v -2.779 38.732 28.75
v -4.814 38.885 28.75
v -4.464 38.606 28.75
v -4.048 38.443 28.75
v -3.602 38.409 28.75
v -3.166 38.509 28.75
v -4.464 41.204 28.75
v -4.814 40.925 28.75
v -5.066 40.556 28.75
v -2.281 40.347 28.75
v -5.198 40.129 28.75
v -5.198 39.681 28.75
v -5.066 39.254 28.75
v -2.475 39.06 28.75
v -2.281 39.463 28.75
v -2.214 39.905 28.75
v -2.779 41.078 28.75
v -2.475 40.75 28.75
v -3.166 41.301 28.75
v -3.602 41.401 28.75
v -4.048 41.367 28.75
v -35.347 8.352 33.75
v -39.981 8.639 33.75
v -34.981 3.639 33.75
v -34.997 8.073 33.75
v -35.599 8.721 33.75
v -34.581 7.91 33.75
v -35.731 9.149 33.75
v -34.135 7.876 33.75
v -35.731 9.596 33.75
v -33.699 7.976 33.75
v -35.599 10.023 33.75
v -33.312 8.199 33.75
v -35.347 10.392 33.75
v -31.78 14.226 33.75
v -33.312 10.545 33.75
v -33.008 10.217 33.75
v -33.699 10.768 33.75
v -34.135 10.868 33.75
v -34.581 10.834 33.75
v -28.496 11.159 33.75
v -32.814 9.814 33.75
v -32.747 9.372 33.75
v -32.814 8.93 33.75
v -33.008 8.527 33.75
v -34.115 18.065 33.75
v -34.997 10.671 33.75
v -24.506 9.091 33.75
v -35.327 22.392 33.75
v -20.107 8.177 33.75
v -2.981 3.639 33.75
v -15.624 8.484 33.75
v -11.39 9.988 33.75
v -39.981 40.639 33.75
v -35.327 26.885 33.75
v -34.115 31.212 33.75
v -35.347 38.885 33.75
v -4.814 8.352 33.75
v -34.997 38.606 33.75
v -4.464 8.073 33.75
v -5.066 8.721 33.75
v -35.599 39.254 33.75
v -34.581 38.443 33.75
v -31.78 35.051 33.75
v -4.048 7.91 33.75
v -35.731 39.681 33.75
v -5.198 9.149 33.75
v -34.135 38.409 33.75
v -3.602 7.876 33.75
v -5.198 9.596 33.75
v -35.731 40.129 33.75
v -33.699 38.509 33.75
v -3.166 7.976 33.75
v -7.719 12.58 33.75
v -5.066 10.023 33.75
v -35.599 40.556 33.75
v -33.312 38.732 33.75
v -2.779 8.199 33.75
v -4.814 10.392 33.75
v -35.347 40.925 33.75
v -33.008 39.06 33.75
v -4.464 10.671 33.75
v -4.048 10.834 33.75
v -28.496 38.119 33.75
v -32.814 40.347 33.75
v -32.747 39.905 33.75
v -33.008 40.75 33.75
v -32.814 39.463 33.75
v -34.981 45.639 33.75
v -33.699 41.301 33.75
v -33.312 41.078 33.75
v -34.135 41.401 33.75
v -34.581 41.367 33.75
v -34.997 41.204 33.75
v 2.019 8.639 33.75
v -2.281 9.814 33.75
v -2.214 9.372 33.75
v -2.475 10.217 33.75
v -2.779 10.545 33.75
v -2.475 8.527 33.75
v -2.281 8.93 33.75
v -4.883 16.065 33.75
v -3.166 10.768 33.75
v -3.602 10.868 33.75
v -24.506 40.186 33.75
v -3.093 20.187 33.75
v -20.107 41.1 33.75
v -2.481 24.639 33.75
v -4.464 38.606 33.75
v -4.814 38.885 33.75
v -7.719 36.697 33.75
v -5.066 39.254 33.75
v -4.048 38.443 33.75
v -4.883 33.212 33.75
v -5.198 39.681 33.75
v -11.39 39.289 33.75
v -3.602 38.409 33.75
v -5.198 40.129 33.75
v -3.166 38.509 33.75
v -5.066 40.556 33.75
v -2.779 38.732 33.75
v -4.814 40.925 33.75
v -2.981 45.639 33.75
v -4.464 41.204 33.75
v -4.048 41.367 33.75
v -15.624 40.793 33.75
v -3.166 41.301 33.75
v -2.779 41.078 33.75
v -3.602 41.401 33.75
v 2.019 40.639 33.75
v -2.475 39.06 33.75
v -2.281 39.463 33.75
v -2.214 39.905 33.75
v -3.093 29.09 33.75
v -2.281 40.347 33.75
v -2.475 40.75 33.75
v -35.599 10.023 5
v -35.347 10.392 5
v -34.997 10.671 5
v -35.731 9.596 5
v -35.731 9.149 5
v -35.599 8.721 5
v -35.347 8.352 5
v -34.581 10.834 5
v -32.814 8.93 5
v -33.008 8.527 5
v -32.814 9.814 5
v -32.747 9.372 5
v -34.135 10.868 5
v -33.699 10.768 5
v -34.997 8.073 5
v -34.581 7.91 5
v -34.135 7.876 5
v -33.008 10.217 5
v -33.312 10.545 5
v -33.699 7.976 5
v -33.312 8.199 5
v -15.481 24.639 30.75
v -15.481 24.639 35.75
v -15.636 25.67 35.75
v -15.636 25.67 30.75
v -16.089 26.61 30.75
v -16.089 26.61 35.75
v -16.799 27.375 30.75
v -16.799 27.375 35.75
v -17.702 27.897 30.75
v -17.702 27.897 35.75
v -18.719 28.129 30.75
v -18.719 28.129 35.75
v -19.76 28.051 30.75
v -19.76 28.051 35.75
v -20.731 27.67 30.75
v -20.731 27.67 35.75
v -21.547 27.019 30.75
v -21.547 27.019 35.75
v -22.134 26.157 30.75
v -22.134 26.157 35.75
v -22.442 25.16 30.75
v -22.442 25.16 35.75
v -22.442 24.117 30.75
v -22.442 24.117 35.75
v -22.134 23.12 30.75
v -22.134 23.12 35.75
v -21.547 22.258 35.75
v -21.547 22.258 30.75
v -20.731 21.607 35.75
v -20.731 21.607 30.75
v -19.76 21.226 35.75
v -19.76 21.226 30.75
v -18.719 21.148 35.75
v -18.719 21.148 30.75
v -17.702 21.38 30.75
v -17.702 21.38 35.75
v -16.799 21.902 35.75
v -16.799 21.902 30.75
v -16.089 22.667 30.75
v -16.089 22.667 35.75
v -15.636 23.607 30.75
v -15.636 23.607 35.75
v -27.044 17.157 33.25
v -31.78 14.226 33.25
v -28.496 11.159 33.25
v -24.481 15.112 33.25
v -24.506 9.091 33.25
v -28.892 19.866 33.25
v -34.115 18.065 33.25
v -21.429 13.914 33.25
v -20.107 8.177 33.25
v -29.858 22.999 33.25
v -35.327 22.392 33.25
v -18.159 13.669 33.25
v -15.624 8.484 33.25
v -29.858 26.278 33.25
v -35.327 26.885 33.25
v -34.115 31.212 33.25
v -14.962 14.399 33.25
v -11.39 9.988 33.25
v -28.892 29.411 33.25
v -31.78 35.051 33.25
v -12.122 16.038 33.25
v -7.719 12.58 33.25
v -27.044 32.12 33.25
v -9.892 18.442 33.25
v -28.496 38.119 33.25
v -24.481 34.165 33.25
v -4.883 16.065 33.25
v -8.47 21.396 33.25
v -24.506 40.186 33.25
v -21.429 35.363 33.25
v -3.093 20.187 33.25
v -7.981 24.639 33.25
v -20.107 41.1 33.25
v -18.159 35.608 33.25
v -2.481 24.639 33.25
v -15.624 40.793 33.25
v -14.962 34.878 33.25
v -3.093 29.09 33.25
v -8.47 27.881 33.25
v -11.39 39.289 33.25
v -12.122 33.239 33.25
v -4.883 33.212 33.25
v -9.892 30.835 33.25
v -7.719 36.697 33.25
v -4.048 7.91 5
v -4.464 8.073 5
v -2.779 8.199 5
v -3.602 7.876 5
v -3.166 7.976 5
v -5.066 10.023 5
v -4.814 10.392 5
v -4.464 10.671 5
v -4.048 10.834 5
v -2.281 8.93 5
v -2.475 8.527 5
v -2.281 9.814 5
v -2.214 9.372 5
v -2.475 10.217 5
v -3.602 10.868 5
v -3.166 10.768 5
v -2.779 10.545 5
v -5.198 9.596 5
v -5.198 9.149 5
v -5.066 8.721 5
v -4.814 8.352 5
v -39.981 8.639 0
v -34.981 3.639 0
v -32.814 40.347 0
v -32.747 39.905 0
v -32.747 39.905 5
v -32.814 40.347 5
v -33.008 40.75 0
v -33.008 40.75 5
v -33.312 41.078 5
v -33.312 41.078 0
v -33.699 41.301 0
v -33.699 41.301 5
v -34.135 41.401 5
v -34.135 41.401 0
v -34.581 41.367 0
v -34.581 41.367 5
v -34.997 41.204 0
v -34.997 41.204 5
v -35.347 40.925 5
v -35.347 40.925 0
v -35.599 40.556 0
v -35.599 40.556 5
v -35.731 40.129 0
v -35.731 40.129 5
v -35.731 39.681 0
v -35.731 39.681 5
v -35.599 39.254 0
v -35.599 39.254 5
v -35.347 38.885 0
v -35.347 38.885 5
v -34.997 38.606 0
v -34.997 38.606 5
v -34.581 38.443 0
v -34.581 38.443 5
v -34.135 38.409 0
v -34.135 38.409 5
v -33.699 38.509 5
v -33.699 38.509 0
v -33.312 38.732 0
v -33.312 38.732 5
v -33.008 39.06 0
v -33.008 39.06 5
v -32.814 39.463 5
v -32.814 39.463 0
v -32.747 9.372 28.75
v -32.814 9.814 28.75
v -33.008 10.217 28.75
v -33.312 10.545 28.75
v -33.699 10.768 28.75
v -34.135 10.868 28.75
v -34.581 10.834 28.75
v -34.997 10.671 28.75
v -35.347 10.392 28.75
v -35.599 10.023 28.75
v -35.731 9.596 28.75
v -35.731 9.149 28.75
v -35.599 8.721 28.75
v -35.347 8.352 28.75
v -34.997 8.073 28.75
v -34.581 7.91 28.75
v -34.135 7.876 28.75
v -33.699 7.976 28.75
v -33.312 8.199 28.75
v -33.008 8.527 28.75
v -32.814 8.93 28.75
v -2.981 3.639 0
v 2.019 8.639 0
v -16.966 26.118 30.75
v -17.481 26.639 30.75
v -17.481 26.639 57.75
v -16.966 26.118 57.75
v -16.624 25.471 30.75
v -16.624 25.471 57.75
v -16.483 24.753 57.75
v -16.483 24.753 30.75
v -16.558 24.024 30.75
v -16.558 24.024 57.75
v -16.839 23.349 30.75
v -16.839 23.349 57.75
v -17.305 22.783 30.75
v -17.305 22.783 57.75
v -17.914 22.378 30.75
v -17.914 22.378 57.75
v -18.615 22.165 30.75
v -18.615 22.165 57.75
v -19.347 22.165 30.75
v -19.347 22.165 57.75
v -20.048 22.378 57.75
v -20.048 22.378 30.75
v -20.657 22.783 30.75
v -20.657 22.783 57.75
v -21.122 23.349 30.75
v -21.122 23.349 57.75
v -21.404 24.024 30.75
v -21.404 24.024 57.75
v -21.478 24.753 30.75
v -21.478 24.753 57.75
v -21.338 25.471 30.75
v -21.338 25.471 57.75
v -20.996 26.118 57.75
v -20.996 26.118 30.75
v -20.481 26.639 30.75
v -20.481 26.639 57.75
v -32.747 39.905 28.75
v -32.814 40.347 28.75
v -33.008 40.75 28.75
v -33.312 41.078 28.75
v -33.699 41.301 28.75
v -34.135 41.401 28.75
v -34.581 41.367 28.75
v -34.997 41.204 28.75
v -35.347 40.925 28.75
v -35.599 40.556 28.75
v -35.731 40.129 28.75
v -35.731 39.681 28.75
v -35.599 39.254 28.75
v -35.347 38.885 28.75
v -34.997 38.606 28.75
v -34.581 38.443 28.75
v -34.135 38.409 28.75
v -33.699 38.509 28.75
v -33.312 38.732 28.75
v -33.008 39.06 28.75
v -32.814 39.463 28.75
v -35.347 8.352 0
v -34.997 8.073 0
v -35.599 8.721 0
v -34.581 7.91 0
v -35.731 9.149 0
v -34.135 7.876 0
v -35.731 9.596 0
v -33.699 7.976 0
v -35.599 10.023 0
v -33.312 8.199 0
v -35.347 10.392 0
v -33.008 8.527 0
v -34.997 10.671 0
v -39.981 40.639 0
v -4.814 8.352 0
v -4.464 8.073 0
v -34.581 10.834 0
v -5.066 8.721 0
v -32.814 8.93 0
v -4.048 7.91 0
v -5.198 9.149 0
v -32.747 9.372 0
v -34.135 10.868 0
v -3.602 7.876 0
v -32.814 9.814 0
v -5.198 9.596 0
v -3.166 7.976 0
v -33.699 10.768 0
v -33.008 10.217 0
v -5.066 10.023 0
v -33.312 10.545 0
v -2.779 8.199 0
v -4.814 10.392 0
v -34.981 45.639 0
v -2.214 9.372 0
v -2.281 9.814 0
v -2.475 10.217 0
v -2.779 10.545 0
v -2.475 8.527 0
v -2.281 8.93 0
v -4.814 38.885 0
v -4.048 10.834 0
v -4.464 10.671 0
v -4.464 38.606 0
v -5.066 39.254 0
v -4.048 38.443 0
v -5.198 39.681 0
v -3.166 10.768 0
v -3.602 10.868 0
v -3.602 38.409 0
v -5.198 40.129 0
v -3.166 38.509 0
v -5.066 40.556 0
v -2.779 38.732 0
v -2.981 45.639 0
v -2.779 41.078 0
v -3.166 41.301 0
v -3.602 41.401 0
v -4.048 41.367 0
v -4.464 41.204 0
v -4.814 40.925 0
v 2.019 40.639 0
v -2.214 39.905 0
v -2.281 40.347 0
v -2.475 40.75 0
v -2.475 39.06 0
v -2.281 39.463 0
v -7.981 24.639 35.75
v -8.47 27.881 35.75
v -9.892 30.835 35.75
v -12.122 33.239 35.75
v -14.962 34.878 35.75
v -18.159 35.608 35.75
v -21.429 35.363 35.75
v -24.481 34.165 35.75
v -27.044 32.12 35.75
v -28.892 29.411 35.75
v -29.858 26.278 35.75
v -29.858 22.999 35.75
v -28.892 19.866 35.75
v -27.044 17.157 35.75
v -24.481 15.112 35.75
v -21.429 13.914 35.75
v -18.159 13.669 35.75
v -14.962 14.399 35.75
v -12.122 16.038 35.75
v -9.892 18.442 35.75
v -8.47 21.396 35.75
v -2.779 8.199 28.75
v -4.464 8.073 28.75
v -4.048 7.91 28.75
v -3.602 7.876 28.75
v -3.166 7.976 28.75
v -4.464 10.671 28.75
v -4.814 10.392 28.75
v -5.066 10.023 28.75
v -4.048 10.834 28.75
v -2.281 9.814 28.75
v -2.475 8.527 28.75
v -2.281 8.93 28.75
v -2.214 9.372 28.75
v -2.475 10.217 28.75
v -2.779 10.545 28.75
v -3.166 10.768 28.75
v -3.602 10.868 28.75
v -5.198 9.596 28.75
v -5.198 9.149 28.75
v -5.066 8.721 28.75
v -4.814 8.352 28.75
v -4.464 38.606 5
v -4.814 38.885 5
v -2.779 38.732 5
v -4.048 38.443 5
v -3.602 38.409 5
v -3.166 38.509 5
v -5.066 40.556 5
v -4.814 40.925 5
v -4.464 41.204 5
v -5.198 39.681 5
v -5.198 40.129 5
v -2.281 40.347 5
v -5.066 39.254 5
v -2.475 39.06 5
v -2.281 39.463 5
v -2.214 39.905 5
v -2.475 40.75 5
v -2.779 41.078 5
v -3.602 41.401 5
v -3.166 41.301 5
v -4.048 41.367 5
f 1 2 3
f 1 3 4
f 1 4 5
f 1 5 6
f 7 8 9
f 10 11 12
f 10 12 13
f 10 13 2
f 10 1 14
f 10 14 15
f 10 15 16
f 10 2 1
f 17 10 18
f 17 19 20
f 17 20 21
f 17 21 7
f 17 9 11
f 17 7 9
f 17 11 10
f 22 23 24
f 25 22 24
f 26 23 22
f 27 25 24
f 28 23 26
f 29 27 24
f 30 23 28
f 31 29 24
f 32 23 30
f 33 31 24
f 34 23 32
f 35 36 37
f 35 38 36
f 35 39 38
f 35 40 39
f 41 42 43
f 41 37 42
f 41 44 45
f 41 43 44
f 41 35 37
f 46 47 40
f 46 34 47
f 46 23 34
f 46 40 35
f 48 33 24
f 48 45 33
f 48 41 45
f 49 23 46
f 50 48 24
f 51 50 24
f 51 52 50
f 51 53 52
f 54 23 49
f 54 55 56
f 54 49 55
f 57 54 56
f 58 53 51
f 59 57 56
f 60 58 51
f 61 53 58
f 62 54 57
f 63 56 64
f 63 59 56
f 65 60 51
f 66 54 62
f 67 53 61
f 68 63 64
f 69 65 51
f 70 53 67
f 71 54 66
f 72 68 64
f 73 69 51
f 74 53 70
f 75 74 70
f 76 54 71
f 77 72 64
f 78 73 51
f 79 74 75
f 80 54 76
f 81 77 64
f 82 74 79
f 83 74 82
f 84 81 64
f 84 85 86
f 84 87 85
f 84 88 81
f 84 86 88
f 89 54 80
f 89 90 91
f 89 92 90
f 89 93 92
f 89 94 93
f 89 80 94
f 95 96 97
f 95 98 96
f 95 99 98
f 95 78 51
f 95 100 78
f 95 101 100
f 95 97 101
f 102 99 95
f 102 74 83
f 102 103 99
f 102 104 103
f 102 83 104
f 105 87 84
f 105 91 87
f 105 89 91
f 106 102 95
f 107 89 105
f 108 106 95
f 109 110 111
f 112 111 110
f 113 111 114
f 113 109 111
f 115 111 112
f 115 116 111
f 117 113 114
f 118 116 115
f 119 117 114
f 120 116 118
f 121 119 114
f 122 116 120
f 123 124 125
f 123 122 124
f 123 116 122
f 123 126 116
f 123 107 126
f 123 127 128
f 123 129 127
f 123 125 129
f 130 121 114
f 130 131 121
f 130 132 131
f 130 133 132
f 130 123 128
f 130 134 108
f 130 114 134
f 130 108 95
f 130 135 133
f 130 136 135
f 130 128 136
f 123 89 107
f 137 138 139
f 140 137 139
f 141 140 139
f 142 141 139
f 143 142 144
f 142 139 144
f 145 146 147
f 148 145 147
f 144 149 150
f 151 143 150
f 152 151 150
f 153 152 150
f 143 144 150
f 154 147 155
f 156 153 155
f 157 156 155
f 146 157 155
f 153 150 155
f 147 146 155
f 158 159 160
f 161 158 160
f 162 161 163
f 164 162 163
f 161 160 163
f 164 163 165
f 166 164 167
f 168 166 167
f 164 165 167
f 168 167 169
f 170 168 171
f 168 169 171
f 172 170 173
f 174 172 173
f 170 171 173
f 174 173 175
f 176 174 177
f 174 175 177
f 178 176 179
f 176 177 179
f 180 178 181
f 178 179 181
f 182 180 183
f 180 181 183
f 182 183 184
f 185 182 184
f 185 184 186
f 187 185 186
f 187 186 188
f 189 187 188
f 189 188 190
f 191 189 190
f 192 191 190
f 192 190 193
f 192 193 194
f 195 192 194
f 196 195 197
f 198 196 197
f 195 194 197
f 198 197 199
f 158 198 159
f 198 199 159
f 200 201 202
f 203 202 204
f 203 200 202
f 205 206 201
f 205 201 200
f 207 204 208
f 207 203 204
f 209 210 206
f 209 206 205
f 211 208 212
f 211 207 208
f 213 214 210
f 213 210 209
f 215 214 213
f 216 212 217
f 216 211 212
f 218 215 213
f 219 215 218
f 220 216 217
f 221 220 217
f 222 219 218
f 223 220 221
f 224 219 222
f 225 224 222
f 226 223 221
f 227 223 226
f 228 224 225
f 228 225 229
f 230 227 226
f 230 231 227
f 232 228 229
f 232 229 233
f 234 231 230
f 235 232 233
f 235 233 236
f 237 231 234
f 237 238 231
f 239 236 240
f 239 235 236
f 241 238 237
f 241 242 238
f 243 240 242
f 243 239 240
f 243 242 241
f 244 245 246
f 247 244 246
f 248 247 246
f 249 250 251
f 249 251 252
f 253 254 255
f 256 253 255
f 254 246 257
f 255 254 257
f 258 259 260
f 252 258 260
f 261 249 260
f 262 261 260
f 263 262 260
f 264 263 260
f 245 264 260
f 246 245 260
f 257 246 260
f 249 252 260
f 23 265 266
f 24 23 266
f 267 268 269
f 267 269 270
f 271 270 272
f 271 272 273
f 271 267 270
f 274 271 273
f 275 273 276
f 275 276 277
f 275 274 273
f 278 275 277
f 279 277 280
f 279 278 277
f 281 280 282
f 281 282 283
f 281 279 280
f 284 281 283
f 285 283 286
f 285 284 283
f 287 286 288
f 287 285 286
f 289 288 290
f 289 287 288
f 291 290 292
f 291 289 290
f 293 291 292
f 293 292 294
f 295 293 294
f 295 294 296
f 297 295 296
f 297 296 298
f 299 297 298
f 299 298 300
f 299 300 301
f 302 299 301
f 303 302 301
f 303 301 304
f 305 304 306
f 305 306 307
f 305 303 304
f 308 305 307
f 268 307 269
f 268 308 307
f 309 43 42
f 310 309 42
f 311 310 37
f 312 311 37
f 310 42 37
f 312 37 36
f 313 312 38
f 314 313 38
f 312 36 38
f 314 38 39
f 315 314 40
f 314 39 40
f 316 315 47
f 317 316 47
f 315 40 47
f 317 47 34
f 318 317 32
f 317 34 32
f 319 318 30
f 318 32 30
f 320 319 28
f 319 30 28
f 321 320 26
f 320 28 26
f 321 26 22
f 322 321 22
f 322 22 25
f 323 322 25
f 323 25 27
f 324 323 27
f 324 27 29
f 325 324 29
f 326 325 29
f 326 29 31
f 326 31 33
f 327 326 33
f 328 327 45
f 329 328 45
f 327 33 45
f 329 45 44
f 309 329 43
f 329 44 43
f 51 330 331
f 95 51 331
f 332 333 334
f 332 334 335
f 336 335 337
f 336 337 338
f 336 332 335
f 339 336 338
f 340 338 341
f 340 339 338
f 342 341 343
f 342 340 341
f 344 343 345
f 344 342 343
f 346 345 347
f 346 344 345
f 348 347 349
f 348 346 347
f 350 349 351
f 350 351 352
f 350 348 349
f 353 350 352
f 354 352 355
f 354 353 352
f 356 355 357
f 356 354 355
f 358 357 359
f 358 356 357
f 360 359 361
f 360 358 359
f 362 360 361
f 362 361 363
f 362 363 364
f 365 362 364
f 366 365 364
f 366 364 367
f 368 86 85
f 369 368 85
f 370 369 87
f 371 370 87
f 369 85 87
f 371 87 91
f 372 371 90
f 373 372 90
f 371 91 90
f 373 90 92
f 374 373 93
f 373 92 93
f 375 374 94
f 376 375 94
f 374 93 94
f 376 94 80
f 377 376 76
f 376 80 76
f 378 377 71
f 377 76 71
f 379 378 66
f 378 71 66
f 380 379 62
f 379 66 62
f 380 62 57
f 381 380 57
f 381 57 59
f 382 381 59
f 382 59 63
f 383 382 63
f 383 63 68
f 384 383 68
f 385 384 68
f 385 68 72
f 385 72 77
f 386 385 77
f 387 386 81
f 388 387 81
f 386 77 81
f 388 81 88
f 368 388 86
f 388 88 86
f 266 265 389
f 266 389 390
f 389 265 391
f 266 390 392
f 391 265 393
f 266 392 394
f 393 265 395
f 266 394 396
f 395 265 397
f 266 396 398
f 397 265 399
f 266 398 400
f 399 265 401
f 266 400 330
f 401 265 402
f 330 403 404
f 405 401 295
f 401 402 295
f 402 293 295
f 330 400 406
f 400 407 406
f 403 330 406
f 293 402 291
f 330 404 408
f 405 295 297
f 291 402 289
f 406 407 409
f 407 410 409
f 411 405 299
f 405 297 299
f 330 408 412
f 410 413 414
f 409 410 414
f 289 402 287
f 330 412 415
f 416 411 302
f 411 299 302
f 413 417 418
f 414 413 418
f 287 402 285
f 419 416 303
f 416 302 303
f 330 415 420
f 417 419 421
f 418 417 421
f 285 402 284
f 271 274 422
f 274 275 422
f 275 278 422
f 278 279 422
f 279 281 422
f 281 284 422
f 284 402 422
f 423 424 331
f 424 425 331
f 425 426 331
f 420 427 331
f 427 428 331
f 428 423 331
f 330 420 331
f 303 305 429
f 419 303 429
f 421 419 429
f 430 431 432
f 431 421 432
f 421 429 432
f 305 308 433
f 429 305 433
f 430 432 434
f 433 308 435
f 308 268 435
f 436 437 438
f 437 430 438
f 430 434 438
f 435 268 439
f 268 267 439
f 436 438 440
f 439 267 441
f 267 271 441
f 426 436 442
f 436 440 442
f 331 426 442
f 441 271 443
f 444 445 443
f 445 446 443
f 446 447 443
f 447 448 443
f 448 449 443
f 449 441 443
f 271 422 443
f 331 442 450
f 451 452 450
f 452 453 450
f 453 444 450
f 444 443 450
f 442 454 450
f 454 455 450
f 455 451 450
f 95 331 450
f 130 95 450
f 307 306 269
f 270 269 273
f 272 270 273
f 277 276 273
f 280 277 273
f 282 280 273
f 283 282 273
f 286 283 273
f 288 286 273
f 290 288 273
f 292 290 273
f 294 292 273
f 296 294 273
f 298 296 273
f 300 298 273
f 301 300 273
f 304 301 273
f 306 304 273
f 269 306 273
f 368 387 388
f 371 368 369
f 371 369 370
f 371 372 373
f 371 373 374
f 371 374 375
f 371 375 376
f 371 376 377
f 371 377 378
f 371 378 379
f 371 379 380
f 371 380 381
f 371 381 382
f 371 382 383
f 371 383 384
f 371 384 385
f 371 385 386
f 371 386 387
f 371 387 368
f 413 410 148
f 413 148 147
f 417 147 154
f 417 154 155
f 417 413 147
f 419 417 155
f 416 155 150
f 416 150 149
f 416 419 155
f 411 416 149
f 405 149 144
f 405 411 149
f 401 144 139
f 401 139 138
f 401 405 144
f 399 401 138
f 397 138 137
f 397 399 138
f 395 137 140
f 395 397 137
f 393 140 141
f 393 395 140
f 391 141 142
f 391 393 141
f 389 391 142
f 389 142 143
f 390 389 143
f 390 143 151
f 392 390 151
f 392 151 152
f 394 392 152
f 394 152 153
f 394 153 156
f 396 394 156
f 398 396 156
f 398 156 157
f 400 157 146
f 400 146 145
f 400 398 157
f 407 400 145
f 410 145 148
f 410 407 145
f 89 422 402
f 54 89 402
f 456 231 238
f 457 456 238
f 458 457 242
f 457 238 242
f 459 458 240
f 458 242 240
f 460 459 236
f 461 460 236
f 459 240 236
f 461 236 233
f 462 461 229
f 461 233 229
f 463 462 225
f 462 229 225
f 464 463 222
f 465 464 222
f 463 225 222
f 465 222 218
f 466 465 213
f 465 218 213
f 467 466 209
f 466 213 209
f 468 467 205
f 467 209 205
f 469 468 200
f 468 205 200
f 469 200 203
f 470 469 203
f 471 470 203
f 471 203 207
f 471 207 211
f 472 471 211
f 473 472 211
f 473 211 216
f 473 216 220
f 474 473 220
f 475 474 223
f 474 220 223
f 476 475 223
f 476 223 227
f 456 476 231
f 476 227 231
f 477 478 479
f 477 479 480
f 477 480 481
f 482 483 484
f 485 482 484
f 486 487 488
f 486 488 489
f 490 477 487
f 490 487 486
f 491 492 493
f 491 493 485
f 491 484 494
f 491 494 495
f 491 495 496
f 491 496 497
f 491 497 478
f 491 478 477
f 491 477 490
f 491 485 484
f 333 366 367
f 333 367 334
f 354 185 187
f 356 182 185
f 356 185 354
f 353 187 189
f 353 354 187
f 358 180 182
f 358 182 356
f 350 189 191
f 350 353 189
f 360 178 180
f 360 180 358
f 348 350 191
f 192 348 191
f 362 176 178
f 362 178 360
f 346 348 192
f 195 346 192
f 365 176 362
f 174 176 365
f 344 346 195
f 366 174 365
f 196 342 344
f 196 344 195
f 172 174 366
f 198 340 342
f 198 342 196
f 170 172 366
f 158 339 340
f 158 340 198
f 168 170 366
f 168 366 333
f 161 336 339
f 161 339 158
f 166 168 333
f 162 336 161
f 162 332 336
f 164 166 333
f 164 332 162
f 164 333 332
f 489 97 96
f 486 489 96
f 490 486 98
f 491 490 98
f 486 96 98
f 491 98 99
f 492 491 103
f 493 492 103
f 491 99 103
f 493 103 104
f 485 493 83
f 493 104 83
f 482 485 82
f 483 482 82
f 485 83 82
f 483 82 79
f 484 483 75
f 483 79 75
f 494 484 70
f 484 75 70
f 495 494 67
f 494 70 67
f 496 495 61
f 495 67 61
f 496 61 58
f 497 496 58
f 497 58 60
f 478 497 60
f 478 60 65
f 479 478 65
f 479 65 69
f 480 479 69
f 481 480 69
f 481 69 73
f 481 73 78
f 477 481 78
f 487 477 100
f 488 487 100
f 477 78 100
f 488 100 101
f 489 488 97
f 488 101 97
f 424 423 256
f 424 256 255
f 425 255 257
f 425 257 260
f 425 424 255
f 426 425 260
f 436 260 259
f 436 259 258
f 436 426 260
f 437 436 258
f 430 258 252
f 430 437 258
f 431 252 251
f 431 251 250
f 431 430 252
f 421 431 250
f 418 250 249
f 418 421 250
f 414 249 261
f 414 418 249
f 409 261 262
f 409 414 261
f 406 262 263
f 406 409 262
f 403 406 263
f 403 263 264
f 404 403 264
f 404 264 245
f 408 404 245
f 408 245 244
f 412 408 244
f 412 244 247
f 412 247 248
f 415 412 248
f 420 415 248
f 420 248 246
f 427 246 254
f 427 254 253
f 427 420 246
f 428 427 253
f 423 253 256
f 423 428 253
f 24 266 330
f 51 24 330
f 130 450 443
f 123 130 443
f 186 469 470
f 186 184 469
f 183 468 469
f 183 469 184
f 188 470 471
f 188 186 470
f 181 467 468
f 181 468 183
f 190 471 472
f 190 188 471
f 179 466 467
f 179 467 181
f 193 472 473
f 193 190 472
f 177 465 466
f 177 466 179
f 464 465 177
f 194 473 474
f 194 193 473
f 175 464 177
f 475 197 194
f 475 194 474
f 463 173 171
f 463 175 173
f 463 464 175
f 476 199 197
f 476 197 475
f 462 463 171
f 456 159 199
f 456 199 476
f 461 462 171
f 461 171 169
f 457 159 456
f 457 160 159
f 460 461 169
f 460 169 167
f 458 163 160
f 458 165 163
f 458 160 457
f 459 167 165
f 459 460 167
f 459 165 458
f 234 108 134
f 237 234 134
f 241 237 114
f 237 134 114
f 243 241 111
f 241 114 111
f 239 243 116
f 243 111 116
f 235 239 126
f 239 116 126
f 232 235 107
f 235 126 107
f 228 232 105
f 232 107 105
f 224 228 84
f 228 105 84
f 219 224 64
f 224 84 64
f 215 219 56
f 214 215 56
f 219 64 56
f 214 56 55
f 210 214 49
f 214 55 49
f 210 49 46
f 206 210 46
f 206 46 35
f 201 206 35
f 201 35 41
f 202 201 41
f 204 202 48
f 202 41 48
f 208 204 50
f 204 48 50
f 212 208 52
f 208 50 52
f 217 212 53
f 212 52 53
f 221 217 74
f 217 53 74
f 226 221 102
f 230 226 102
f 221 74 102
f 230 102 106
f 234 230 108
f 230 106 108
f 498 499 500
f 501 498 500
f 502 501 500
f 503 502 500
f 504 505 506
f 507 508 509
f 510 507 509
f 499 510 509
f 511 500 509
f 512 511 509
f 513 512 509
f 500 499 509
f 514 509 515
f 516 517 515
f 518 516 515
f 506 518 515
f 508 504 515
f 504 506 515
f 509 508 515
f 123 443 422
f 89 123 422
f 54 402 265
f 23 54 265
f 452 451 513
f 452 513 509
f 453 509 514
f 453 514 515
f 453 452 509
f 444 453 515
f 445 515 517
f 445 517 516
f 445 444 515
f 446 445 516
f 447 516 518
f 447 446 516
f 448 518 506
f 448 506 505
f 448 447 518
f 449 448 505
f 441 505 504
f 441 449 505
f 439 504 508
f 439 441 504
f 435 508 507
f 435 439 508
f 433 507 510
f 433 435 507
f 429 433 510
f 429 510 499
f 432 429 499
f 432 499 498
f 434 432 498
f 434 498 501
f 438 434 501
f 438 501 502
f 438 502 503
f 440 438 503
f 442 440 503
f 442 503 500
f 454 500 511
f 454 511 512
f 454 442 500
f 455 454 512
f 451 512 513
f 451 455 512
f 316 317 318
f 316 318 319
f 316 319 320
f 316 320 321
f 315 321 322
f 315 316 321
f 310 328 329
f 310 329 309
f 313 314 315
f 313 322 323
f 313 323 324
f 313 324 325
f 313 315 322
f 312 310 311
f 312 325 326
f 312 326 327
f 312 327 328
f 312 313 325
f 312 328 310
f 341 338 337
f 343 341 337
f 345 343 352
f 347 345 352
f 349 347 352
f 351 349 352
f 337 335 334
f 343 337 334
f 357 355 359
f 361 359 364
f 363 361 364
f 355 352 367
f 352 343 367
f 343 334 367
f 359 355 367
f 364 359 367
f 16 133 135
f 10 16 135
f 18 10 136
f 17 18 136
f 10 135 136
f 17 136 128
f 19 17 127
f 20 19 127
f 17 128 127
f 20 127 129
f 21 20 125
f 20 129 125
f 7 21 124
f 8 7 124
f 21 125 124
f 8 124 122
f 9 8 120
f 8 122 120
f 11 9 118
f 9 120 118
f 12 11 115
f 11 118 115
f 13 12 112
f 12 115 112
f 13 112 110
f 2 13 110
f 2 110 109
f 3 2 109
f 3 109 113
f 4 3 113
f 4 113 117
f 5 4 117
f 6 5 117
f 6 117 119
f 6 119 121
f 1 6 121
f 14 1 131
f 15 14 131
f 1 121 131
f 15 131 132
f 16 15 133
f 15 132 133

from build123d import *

# Parameters (mm, degrees)
BOSS_EXTRUDE1_DEPTH = 33.75
SKETCH2_R           = 16.5
CUT_EXTRUDE1_DEPTH  = 0.5
SKETCH3_R           = 11
BOSS_EXTRUDE2_DEPTH = 2.5
SKETCH4_R           = 3.5
CUT_EXTRUDE2_DEPTH  = 5
BOSS_EXTRUDE3_DEPTH = 27
SKETCH6_R           = 1.5
CUT_EXTRUDE3_DEPTH  = 5


with BuildPart() as part:
    # Sketch1 → Boss-Extrude1 (new body)
    with BuildSketch(Plane.XY):
        Polygon((-34.980846502, 45.63851346), (-39.980846502, 40.63851346), (-39.980846502, 8.63851346), (-34.980846502, 3.63851346), (-2.980846502, 3.63851346), (2.019153498, 8.63851346), (2.019153498, 40.63851346), (-2.980846502, 45.63851346), align=None)
    extrude(amount=BOSS_EXTRUDE1_DEPTH)

    # Sketch2 → Cut-Extrude1 (cut)
    with BuildSketch(Plane.XY.offset(33.75)):
        with Locations((-18.980846502, 24.63851346)):
            Circle(SKETCH2_R)
    extrude(amount=-CUT_EXTRUDE1_DEPTH, mode=Mode.SUBTRACT)

    # Sketch3 → Boss-Extrude2 (add)
    with BuildSketch(Plane.XY.offset(33.25)):
        with Locations((-18.980846502, 24.63851346)):
            Circle(SKETCH3_R)
    extrude(amount=BOSS_EXTRUDE2_DEPTH)

    # Sketch4 → Cut-Extrude2 (cut)
    with BuildSketch(Plane.XY.offset(35.75)):
        with Locations((-18.980846502, 24.63851346)):
            Circle(SKETCH4_R)
    extrude(amount=-CUT_EXTRUDE2_DEPTH, mode=Mode.SUBTRACT)

    # Sketch5 → Boss-Extrude3 (add)
    with BuildSketch(Plane.XY.offset(30.75)):
        with BuildLine():
            Line((-20.480846502, 26.63851346), (-17.480846502, 26.63851346))
            ThreePointArc((-17.480846502, 26.63851346), (-18.980846502, 22.13851346), (-20.480846502, 26.63851346))
        make_face()
    extrude(amount=BOSS_EXTRUDE3_DEPTH)

    # Sketch6 → Cut-Extrude3 (cut)
    with BuildSketch(Plane.XY.offset(33.75)):
        with Locations((-34.247281908, 39.904948866)):
            Circle(SKETCH6_R)
        with Locations((-3.714411096, 39.904948866)):
            Circle(SKETCH6_R)
        with Locations((-3.714411096, 9.372078054)):
            Circle(SKETCH6_R)
        with Locations((-34.247281908, 9.372078054)):
            Circle(SKETCH6_R)
    cut_extrude3 = extrude(amount=-CUT_EXTRUDE3_DEPTH, mode=Mode.SUBTRACT)

    # Mirror1: Cut-Extrude3 across plane
    add(cut_extrude3.mirror(Plane(origin=(0, 0, 16.875), x_dir=(1, 0, 0), z_dir=(0, 0, -1))), mode=Mode.SUBTRACT)


solid = part.part
